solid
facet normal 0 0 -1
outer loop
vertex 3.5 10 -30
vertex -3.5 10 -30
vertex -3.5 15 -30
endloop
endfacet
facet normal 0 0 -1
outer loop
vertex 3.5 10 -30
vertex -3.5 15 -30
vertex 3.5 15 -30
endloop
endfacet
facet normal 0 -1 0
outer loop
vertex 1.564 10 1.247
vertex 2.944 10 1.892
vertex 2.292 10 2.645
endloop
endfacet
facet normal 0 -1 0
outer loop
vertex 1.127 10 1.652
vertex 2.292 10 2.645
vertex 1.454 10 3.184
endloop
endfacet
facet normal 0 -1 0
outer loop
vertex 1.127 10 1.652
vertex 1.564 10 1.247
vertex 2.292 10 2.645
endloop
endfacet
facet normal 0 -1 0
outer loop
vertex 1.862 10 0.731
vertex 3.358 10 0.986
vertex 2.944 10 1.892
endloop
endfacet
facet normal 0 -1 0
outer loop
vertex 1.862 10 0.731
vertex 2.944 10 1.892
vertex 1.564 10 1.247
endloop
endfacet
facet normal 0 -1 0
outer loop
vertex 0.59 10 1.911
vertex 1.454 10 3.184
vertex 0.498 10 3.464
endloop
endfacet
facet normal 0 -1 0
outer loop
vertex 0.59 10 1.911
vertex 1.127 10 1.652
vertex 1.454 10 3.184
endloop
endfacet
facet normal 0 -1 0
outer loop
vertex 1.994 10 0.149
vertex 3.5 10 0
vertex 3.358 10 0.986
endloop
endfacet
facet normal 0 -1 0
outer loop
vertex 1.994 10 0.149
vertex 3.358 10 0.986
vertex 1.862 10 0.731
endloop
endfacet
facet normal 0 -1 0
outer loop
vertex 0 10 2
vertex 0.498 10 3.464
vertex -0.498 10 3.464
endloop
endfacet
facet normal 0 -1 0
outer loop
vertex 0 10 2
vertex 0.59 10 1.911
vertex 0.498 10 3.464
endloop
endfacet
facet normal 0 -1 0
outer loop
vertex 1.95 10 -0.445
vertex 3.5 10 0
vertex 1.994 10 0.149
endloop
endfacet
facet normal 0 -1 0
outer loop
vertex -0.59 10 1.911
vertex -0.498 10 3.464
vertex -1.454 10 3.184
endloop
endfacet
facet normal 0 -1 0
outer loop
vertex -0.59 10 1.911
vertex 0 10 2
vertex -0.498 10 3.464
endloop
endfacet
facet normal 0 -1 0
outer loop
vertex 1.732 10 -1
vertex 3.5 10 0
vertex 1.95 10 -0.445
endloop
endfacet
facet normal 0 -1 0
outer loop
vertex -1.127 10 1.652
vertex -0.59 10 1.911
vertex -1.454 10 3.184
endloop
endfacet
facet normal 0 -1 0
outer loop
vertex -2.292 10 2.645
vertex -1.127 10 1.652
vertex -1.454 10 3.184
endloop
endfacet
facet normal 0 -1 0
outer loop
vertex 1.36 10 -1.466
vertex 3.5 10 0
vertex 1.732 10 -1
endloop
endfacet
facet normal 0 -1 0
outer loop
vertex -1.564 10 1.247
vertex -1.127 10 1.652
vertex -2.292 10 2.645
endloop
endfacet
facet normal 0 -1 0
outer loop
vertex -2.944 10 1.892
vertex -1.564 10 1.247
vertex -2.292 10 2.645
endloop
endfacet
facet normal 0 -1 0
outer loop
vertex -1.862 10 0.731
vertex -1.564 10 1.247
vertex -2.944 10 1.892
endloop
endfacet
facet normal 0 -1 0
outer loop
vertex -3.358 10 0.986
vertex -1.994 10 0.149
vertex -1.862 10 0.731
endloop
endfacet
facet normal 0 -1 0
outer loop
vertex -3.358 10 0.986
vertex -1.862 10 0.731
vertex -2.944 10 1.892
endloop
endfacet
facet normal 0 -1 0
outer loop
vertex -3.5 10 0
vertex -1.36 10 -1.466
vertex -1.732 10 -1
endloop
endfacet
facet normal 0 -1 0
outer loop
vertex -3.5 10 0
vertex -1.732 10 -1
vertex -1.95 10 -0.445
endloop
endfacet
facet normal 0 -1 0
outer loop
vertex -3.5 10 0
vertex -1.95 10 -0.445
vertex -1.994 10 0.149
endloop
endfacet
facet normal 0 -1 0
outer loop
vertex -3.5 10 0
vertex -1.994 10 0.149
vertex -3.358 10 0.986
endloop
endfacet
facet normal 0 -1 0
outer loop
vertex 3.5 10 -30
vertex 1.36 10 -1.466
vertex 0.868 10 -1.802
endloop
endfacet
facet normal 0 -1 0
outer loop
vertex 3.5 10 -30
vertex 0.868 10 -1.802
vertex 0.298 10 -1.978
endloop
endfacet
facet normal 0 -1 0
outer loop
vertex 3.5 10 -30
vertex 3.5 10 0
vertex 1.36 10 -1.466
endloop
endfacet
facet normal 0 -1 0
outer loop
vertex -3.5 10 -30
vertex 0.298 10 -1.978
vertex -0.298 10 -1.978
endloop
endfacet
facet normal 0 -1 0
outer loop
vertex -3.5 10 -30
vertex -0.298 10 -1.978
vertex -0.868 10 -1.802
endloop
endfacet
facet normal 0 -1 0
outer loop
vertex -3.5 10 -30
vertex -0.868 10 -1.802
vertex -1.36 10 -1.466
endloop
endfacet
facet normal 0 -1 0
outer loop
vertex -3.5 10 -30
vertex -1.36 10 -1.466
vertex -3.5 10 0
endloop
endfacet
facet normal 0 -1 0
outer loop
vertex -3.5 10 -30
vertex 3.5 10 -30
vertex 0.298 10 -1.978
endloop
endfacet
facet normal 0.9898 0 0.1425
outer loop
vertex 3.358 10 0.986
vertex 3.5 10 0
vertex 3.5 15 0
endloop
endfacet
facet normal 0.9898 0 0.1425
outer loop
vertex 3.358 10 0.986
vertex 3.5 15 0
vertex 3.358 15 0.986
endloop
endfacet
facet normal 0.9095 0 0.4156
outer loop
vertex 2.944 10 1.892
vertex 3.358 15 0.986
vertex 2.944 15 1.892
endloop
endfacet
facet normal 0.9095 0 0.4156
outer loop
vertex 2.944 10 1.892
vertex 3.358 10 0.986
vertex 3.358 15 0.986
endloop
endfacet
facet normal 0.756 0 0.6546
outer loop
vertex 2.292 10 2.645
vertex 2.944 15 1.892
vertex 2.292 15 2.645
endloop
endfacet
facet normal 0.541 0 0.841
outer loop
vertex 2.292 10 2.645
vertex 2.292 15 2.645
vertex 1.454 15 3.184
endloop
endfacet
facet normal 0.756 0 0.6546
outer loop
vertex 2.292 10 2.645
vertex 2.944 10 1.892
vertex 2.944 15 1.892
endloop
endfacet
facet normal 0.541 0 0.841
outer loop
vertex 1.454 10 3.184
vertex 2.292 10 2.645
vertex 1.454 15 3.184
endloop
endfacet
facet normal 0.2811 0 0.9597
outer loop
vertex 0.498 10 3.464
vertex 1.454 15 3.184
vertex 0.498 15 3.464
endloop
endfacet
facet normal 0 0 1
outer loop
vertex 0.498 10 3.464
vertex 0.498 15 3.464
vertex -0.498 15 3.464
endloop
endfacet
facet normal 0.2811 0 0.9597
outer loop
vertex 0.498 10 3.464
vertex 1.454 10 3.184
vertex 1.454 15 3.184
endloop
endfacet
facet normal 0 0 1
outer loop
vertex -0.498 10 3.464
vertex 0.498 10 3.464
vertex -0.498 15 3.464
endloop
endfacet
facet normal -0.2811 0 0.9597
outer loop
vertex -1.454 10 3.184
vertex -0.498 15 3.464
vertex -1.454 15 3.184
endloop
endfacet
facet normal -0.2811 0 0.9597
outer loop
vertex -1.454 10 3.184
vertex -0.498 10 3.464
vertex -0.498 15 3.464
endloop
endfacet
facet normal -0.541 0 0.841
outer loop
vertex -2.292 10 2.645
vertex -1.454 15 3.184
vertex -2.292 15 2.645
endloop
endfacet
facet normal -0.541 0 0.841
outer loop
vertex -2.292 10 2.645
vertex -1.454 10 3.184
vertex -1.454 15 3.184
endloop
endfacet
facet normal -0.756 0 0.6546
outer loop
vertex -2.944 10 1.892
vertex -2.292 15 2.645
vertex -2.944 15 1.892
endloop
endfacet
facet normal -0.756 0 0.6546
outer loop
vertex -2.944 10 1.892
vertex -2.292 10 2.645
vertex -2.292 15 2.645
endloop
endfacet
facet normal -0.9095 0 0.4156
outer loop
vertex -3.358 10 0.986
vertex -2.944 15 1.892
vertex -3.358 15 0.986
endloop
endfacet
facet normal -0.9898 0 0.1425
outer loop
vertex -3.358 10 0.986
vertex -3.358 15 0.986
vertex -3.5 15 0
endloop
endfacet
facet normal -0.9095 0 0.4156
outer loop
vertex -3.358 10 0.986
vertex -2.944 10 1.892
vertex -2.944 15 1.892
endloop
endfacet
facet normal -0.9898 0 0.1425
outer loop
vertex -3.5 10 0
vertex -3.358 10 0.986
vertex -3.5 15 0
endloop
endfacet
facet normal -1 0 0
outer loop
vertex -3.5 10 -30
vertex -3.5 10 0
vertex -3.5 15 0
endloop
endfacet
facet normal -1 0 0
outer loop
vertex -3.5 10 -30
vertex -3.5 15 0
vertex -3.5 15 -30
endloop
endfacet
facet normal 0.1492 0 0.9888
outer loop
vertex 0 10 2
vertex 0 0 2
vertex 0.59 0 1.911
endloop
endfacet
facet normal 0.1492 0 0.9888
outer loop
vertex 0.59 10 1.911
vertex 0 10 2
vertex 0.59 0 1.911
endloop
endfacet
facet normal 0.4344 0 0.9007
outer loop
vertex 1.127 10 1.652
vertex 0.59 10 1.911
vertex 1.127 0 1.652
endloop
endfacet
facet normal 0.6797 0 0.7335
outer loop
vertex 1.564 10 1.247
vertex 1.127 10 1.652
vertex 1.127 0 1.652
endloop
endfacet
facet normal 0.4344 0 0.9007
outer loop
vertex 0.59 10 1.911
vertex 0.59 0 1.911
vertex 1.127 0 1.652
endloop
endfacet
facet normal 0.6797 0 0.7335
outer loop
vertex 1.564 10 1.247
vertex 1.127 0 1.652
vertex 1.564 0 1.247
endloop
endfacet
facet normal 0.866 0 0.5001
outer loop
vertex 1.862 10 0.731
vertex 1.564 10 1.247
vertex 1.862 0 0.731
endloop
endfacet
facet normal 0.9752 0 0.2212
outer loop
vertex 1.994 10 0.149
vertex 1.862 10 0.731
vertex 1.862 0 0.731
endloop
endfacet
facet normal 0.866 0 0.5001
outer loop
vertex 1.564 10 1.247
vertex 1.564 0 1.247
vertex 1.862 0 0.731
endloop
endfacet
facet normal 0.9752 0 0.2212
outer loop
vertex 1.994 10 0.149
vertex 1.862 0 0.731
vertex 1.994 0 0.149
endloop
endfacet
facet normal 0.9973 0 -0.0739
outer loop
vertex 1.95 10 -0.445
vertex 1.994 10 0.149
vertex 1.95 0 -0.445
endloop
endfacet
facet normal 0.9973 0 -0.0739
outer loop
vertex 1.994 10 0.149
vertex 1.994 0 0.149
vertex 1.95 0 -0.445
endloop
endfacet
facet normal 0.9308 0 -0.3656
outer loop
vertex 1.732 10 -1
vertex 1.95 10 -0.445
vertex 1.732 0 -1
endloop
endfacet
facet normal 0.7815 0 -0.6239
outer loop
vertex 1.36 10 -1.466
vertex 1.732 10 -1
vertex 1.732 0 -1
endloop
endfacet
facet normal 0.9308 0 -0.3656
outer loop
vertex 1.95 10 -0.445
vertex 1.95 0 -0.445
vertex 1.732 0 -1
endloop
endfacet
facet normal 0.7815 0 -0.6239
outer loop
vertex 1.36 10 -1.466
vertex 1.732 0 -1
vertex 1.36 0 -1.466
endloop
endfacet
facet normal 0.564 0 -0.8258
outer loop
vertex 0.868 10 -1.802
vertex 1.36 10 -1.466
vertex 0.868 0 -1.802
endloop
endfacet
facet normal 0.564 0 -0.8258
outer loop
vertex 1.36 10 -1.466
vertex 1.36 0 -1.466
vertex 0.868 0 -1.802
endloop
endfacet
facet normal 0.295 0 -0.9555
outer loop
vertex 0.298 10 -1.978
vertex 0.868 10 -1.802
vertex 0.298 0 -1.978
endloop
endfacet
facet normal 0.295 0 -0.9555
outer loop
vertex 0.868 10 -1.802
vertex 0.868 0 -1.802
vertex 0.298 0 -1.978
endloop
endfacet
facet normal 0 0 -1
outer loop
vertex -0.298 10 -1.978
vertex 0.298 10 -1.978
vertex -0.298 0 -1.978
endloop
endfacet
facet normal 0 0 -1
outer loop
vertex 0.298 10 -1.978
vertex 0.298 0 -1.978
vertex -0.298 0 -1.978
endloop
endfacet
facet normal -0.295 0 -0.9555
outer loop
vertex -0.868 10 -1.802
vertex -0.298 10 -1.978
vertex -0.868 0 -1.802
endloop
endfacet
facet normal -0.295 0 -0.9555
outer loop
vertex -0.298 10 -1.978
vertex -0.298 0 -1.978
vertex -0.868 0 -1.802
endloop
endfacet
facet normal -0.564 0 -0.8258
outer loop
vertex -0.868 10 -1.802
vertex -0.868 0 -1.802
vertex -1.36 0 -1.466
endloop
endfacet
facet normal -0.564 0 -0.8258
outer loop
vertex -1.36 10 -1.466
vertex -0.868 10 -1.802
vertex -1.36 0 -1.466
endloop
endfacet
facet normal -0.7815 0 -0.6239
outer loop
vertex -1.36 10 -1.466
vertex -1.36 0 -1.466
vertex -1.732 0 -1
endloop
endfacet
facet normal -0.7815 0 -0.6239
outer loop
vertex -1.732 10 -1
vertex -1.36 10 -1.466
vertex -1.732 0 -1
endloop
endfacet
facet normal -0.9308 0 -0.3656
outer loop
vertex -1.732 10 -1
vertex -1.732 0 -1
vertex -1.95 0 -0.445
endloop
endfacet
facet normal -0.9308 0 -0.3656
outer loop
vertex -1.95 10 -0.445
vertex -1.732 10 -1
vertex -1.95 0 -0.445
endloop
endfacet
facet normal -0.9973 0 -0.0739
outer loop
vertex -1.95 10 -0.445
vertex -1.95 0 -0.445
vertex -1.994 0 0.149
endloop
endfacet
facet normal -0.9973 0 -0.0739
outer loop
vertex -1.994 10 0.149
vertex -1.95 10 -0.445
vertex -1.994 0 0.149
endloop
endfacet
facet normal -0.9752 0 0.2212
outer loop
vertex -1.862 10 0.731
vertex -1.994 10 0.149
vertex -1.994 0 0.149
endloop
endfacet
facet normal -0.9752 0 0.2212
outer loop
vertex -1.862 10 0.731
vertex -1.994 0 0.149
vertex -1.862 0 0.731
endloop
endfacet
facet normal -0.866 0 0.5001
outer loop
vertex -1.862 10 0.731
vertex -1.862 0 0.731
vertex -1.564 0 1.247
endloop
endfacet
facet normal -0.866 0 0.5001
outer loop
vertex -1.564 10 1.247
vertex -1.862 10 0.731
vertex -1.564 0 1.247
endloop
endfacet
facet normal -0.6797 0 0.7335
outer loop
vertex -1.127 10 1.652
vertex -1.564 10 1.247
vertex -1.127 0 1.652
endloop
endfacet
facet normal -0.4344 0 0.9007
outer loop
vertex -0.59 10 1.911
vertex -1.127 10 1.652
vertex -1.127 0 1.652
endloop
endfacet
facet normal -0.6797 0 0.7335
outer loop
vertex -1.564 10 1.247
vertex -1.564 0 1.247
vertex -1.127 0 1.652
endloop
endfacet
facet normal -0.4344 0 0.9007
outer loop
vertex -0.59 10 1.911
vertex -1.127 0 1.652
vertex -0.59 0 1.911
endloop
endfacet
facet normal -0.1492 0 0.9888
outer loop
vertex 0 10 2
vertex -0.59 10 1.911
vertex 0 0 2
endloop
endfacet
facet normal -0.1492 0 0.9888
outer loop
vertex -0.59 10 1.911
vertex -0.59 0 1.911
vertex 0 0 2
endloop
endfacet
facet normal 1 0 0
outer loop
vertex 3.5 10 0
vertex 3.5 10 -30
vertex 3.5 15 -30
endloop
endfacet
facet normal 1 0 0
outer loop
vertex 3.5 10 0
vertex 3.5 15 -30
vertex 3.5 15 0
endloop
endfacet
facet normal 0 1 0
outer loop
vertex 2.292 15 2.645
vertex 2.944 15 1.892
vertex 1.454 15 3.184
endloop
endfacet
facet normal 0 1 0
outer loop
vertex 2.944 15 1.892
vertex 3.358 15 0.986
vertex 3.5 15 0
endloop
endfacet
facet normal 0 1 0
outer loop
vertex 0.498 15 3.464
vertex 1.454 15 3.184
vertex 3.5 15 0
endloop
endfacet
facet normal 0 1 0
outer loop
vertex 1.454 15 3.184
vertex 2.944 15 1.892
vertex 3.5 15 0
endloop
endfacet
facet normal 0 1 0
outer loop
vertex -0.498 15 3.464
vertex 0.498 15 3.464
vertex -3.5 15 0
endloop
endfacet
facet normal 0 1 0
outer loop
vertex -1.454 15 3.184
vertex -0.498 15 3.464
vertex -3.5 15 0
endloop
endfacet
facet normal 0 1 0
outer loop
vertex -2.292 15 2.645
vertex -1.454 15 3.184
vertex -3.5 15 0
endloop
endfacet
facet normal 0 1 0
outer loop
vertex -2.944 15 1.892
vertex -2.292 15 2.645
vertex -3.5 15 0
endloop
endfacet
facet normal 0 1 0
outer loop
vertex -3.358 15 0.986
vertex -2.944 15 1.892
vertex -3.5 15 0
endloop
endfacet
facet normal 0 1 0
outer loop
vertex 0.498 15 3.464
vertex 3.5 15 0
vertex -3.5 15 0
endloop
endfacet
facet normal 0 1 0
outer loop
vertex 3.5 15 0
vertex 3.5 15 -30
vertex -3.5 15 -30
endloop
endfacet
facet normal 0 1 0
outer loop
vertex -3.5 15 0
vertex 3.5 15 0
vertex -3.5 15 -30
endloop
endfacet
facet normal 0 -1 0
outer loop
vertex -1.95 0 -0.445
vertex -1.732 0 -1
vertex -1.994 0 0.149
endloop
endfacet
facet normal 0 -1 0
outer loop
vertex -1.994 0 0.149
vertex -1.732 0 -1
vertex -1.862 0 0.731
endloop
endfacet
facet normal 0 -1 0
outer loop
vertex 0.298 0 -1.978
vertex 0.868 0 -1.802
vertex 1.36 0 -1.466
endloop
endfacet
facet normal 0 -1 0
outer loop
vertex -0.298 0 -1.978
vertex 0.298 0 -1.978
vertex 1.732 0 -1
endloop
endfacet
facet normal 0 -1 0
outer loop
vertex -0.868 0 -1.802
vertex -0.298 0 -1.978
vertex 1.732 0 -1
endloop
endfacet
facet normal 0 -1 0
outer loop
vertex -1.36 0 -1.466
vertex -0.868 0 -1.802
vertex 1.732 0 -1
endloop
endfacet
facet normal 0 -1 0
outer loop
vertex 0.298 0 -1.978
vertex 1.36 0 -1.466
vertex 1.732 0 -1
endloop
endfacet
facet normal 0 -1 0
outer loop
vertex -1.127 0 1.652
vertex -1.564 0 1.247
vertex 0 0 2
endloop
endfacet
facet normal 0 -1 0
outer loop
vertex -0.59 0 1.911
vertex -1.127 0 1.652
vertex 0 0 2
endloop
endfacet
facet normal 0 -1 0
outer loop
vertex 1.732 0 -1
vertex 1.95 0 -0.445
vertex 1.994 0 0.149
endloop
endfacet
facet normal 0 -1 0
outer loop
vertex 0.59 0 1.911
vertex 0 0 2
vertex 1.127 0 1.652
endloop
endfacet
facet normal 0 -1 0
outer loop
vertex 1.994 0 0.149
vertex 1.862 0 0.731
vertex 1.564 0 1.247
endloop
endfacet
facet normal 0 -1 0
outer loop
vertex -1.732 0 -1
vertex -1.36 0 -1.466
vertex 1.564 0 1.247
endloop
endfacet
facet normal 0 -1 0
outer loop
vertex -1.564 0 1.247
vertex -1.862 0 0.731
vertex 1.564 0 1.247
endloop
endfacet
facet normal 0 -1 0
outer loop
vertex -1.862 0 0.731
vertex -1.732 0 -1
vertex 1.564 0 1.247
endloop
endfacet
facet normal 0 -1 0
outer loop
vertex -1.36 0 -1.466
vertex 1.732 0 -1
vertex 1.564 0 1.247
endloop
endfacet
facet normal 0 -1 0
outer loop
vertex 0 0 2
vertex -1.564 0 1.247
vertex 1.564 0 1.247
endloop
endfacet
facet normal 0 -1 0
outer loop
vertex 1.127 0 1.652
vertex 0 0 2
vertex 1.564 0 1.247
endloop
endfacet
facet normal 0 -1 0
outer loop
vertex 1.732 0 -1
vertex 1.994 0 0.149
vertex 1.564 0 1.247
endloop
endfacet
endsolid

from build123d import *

# Parameters (mm, degrees)
SKETCH_1_R      = 2
EXTRUDE_1_DEPTH = 10
EXTRUDE_2_DEPTH = 5


with BuildPart() as part:
    # Эскиз1 → Бобышка-Вытянуть1 (new body)
    with BuildSketch(Plane(origin=(0, 0, 0), x_dir=(1, 0, 0), z_dir=(0, 1, 0))):
        with Locations(Location((0, 0, 0), (0, 0, 270))):
            Circle(SKETCH_1_R)
    extrude(amount=EXTRUDE_1_DEPTH)

    # Эскиз2 → Бобышка-Вытянуть2 (add)
    with BuildSketch(Plane(origin=(0, 10, 0), x_dir=(1, 0, 0), z_dir=(0, 1, 0))):
        with BuildLine():
            Line((-3.5, 0), (-3.5, 30))
            Line((-3.5, 30), (3.5, 30))
            Line((3.5, 30), (3.5, 0))
            ThreePointArc((3.5, 0), (0, -3.5), (-3.5, 0))
        make_face()
    extrude(amount=EXTRUDE_2_DEPTH)


solid = part.part
